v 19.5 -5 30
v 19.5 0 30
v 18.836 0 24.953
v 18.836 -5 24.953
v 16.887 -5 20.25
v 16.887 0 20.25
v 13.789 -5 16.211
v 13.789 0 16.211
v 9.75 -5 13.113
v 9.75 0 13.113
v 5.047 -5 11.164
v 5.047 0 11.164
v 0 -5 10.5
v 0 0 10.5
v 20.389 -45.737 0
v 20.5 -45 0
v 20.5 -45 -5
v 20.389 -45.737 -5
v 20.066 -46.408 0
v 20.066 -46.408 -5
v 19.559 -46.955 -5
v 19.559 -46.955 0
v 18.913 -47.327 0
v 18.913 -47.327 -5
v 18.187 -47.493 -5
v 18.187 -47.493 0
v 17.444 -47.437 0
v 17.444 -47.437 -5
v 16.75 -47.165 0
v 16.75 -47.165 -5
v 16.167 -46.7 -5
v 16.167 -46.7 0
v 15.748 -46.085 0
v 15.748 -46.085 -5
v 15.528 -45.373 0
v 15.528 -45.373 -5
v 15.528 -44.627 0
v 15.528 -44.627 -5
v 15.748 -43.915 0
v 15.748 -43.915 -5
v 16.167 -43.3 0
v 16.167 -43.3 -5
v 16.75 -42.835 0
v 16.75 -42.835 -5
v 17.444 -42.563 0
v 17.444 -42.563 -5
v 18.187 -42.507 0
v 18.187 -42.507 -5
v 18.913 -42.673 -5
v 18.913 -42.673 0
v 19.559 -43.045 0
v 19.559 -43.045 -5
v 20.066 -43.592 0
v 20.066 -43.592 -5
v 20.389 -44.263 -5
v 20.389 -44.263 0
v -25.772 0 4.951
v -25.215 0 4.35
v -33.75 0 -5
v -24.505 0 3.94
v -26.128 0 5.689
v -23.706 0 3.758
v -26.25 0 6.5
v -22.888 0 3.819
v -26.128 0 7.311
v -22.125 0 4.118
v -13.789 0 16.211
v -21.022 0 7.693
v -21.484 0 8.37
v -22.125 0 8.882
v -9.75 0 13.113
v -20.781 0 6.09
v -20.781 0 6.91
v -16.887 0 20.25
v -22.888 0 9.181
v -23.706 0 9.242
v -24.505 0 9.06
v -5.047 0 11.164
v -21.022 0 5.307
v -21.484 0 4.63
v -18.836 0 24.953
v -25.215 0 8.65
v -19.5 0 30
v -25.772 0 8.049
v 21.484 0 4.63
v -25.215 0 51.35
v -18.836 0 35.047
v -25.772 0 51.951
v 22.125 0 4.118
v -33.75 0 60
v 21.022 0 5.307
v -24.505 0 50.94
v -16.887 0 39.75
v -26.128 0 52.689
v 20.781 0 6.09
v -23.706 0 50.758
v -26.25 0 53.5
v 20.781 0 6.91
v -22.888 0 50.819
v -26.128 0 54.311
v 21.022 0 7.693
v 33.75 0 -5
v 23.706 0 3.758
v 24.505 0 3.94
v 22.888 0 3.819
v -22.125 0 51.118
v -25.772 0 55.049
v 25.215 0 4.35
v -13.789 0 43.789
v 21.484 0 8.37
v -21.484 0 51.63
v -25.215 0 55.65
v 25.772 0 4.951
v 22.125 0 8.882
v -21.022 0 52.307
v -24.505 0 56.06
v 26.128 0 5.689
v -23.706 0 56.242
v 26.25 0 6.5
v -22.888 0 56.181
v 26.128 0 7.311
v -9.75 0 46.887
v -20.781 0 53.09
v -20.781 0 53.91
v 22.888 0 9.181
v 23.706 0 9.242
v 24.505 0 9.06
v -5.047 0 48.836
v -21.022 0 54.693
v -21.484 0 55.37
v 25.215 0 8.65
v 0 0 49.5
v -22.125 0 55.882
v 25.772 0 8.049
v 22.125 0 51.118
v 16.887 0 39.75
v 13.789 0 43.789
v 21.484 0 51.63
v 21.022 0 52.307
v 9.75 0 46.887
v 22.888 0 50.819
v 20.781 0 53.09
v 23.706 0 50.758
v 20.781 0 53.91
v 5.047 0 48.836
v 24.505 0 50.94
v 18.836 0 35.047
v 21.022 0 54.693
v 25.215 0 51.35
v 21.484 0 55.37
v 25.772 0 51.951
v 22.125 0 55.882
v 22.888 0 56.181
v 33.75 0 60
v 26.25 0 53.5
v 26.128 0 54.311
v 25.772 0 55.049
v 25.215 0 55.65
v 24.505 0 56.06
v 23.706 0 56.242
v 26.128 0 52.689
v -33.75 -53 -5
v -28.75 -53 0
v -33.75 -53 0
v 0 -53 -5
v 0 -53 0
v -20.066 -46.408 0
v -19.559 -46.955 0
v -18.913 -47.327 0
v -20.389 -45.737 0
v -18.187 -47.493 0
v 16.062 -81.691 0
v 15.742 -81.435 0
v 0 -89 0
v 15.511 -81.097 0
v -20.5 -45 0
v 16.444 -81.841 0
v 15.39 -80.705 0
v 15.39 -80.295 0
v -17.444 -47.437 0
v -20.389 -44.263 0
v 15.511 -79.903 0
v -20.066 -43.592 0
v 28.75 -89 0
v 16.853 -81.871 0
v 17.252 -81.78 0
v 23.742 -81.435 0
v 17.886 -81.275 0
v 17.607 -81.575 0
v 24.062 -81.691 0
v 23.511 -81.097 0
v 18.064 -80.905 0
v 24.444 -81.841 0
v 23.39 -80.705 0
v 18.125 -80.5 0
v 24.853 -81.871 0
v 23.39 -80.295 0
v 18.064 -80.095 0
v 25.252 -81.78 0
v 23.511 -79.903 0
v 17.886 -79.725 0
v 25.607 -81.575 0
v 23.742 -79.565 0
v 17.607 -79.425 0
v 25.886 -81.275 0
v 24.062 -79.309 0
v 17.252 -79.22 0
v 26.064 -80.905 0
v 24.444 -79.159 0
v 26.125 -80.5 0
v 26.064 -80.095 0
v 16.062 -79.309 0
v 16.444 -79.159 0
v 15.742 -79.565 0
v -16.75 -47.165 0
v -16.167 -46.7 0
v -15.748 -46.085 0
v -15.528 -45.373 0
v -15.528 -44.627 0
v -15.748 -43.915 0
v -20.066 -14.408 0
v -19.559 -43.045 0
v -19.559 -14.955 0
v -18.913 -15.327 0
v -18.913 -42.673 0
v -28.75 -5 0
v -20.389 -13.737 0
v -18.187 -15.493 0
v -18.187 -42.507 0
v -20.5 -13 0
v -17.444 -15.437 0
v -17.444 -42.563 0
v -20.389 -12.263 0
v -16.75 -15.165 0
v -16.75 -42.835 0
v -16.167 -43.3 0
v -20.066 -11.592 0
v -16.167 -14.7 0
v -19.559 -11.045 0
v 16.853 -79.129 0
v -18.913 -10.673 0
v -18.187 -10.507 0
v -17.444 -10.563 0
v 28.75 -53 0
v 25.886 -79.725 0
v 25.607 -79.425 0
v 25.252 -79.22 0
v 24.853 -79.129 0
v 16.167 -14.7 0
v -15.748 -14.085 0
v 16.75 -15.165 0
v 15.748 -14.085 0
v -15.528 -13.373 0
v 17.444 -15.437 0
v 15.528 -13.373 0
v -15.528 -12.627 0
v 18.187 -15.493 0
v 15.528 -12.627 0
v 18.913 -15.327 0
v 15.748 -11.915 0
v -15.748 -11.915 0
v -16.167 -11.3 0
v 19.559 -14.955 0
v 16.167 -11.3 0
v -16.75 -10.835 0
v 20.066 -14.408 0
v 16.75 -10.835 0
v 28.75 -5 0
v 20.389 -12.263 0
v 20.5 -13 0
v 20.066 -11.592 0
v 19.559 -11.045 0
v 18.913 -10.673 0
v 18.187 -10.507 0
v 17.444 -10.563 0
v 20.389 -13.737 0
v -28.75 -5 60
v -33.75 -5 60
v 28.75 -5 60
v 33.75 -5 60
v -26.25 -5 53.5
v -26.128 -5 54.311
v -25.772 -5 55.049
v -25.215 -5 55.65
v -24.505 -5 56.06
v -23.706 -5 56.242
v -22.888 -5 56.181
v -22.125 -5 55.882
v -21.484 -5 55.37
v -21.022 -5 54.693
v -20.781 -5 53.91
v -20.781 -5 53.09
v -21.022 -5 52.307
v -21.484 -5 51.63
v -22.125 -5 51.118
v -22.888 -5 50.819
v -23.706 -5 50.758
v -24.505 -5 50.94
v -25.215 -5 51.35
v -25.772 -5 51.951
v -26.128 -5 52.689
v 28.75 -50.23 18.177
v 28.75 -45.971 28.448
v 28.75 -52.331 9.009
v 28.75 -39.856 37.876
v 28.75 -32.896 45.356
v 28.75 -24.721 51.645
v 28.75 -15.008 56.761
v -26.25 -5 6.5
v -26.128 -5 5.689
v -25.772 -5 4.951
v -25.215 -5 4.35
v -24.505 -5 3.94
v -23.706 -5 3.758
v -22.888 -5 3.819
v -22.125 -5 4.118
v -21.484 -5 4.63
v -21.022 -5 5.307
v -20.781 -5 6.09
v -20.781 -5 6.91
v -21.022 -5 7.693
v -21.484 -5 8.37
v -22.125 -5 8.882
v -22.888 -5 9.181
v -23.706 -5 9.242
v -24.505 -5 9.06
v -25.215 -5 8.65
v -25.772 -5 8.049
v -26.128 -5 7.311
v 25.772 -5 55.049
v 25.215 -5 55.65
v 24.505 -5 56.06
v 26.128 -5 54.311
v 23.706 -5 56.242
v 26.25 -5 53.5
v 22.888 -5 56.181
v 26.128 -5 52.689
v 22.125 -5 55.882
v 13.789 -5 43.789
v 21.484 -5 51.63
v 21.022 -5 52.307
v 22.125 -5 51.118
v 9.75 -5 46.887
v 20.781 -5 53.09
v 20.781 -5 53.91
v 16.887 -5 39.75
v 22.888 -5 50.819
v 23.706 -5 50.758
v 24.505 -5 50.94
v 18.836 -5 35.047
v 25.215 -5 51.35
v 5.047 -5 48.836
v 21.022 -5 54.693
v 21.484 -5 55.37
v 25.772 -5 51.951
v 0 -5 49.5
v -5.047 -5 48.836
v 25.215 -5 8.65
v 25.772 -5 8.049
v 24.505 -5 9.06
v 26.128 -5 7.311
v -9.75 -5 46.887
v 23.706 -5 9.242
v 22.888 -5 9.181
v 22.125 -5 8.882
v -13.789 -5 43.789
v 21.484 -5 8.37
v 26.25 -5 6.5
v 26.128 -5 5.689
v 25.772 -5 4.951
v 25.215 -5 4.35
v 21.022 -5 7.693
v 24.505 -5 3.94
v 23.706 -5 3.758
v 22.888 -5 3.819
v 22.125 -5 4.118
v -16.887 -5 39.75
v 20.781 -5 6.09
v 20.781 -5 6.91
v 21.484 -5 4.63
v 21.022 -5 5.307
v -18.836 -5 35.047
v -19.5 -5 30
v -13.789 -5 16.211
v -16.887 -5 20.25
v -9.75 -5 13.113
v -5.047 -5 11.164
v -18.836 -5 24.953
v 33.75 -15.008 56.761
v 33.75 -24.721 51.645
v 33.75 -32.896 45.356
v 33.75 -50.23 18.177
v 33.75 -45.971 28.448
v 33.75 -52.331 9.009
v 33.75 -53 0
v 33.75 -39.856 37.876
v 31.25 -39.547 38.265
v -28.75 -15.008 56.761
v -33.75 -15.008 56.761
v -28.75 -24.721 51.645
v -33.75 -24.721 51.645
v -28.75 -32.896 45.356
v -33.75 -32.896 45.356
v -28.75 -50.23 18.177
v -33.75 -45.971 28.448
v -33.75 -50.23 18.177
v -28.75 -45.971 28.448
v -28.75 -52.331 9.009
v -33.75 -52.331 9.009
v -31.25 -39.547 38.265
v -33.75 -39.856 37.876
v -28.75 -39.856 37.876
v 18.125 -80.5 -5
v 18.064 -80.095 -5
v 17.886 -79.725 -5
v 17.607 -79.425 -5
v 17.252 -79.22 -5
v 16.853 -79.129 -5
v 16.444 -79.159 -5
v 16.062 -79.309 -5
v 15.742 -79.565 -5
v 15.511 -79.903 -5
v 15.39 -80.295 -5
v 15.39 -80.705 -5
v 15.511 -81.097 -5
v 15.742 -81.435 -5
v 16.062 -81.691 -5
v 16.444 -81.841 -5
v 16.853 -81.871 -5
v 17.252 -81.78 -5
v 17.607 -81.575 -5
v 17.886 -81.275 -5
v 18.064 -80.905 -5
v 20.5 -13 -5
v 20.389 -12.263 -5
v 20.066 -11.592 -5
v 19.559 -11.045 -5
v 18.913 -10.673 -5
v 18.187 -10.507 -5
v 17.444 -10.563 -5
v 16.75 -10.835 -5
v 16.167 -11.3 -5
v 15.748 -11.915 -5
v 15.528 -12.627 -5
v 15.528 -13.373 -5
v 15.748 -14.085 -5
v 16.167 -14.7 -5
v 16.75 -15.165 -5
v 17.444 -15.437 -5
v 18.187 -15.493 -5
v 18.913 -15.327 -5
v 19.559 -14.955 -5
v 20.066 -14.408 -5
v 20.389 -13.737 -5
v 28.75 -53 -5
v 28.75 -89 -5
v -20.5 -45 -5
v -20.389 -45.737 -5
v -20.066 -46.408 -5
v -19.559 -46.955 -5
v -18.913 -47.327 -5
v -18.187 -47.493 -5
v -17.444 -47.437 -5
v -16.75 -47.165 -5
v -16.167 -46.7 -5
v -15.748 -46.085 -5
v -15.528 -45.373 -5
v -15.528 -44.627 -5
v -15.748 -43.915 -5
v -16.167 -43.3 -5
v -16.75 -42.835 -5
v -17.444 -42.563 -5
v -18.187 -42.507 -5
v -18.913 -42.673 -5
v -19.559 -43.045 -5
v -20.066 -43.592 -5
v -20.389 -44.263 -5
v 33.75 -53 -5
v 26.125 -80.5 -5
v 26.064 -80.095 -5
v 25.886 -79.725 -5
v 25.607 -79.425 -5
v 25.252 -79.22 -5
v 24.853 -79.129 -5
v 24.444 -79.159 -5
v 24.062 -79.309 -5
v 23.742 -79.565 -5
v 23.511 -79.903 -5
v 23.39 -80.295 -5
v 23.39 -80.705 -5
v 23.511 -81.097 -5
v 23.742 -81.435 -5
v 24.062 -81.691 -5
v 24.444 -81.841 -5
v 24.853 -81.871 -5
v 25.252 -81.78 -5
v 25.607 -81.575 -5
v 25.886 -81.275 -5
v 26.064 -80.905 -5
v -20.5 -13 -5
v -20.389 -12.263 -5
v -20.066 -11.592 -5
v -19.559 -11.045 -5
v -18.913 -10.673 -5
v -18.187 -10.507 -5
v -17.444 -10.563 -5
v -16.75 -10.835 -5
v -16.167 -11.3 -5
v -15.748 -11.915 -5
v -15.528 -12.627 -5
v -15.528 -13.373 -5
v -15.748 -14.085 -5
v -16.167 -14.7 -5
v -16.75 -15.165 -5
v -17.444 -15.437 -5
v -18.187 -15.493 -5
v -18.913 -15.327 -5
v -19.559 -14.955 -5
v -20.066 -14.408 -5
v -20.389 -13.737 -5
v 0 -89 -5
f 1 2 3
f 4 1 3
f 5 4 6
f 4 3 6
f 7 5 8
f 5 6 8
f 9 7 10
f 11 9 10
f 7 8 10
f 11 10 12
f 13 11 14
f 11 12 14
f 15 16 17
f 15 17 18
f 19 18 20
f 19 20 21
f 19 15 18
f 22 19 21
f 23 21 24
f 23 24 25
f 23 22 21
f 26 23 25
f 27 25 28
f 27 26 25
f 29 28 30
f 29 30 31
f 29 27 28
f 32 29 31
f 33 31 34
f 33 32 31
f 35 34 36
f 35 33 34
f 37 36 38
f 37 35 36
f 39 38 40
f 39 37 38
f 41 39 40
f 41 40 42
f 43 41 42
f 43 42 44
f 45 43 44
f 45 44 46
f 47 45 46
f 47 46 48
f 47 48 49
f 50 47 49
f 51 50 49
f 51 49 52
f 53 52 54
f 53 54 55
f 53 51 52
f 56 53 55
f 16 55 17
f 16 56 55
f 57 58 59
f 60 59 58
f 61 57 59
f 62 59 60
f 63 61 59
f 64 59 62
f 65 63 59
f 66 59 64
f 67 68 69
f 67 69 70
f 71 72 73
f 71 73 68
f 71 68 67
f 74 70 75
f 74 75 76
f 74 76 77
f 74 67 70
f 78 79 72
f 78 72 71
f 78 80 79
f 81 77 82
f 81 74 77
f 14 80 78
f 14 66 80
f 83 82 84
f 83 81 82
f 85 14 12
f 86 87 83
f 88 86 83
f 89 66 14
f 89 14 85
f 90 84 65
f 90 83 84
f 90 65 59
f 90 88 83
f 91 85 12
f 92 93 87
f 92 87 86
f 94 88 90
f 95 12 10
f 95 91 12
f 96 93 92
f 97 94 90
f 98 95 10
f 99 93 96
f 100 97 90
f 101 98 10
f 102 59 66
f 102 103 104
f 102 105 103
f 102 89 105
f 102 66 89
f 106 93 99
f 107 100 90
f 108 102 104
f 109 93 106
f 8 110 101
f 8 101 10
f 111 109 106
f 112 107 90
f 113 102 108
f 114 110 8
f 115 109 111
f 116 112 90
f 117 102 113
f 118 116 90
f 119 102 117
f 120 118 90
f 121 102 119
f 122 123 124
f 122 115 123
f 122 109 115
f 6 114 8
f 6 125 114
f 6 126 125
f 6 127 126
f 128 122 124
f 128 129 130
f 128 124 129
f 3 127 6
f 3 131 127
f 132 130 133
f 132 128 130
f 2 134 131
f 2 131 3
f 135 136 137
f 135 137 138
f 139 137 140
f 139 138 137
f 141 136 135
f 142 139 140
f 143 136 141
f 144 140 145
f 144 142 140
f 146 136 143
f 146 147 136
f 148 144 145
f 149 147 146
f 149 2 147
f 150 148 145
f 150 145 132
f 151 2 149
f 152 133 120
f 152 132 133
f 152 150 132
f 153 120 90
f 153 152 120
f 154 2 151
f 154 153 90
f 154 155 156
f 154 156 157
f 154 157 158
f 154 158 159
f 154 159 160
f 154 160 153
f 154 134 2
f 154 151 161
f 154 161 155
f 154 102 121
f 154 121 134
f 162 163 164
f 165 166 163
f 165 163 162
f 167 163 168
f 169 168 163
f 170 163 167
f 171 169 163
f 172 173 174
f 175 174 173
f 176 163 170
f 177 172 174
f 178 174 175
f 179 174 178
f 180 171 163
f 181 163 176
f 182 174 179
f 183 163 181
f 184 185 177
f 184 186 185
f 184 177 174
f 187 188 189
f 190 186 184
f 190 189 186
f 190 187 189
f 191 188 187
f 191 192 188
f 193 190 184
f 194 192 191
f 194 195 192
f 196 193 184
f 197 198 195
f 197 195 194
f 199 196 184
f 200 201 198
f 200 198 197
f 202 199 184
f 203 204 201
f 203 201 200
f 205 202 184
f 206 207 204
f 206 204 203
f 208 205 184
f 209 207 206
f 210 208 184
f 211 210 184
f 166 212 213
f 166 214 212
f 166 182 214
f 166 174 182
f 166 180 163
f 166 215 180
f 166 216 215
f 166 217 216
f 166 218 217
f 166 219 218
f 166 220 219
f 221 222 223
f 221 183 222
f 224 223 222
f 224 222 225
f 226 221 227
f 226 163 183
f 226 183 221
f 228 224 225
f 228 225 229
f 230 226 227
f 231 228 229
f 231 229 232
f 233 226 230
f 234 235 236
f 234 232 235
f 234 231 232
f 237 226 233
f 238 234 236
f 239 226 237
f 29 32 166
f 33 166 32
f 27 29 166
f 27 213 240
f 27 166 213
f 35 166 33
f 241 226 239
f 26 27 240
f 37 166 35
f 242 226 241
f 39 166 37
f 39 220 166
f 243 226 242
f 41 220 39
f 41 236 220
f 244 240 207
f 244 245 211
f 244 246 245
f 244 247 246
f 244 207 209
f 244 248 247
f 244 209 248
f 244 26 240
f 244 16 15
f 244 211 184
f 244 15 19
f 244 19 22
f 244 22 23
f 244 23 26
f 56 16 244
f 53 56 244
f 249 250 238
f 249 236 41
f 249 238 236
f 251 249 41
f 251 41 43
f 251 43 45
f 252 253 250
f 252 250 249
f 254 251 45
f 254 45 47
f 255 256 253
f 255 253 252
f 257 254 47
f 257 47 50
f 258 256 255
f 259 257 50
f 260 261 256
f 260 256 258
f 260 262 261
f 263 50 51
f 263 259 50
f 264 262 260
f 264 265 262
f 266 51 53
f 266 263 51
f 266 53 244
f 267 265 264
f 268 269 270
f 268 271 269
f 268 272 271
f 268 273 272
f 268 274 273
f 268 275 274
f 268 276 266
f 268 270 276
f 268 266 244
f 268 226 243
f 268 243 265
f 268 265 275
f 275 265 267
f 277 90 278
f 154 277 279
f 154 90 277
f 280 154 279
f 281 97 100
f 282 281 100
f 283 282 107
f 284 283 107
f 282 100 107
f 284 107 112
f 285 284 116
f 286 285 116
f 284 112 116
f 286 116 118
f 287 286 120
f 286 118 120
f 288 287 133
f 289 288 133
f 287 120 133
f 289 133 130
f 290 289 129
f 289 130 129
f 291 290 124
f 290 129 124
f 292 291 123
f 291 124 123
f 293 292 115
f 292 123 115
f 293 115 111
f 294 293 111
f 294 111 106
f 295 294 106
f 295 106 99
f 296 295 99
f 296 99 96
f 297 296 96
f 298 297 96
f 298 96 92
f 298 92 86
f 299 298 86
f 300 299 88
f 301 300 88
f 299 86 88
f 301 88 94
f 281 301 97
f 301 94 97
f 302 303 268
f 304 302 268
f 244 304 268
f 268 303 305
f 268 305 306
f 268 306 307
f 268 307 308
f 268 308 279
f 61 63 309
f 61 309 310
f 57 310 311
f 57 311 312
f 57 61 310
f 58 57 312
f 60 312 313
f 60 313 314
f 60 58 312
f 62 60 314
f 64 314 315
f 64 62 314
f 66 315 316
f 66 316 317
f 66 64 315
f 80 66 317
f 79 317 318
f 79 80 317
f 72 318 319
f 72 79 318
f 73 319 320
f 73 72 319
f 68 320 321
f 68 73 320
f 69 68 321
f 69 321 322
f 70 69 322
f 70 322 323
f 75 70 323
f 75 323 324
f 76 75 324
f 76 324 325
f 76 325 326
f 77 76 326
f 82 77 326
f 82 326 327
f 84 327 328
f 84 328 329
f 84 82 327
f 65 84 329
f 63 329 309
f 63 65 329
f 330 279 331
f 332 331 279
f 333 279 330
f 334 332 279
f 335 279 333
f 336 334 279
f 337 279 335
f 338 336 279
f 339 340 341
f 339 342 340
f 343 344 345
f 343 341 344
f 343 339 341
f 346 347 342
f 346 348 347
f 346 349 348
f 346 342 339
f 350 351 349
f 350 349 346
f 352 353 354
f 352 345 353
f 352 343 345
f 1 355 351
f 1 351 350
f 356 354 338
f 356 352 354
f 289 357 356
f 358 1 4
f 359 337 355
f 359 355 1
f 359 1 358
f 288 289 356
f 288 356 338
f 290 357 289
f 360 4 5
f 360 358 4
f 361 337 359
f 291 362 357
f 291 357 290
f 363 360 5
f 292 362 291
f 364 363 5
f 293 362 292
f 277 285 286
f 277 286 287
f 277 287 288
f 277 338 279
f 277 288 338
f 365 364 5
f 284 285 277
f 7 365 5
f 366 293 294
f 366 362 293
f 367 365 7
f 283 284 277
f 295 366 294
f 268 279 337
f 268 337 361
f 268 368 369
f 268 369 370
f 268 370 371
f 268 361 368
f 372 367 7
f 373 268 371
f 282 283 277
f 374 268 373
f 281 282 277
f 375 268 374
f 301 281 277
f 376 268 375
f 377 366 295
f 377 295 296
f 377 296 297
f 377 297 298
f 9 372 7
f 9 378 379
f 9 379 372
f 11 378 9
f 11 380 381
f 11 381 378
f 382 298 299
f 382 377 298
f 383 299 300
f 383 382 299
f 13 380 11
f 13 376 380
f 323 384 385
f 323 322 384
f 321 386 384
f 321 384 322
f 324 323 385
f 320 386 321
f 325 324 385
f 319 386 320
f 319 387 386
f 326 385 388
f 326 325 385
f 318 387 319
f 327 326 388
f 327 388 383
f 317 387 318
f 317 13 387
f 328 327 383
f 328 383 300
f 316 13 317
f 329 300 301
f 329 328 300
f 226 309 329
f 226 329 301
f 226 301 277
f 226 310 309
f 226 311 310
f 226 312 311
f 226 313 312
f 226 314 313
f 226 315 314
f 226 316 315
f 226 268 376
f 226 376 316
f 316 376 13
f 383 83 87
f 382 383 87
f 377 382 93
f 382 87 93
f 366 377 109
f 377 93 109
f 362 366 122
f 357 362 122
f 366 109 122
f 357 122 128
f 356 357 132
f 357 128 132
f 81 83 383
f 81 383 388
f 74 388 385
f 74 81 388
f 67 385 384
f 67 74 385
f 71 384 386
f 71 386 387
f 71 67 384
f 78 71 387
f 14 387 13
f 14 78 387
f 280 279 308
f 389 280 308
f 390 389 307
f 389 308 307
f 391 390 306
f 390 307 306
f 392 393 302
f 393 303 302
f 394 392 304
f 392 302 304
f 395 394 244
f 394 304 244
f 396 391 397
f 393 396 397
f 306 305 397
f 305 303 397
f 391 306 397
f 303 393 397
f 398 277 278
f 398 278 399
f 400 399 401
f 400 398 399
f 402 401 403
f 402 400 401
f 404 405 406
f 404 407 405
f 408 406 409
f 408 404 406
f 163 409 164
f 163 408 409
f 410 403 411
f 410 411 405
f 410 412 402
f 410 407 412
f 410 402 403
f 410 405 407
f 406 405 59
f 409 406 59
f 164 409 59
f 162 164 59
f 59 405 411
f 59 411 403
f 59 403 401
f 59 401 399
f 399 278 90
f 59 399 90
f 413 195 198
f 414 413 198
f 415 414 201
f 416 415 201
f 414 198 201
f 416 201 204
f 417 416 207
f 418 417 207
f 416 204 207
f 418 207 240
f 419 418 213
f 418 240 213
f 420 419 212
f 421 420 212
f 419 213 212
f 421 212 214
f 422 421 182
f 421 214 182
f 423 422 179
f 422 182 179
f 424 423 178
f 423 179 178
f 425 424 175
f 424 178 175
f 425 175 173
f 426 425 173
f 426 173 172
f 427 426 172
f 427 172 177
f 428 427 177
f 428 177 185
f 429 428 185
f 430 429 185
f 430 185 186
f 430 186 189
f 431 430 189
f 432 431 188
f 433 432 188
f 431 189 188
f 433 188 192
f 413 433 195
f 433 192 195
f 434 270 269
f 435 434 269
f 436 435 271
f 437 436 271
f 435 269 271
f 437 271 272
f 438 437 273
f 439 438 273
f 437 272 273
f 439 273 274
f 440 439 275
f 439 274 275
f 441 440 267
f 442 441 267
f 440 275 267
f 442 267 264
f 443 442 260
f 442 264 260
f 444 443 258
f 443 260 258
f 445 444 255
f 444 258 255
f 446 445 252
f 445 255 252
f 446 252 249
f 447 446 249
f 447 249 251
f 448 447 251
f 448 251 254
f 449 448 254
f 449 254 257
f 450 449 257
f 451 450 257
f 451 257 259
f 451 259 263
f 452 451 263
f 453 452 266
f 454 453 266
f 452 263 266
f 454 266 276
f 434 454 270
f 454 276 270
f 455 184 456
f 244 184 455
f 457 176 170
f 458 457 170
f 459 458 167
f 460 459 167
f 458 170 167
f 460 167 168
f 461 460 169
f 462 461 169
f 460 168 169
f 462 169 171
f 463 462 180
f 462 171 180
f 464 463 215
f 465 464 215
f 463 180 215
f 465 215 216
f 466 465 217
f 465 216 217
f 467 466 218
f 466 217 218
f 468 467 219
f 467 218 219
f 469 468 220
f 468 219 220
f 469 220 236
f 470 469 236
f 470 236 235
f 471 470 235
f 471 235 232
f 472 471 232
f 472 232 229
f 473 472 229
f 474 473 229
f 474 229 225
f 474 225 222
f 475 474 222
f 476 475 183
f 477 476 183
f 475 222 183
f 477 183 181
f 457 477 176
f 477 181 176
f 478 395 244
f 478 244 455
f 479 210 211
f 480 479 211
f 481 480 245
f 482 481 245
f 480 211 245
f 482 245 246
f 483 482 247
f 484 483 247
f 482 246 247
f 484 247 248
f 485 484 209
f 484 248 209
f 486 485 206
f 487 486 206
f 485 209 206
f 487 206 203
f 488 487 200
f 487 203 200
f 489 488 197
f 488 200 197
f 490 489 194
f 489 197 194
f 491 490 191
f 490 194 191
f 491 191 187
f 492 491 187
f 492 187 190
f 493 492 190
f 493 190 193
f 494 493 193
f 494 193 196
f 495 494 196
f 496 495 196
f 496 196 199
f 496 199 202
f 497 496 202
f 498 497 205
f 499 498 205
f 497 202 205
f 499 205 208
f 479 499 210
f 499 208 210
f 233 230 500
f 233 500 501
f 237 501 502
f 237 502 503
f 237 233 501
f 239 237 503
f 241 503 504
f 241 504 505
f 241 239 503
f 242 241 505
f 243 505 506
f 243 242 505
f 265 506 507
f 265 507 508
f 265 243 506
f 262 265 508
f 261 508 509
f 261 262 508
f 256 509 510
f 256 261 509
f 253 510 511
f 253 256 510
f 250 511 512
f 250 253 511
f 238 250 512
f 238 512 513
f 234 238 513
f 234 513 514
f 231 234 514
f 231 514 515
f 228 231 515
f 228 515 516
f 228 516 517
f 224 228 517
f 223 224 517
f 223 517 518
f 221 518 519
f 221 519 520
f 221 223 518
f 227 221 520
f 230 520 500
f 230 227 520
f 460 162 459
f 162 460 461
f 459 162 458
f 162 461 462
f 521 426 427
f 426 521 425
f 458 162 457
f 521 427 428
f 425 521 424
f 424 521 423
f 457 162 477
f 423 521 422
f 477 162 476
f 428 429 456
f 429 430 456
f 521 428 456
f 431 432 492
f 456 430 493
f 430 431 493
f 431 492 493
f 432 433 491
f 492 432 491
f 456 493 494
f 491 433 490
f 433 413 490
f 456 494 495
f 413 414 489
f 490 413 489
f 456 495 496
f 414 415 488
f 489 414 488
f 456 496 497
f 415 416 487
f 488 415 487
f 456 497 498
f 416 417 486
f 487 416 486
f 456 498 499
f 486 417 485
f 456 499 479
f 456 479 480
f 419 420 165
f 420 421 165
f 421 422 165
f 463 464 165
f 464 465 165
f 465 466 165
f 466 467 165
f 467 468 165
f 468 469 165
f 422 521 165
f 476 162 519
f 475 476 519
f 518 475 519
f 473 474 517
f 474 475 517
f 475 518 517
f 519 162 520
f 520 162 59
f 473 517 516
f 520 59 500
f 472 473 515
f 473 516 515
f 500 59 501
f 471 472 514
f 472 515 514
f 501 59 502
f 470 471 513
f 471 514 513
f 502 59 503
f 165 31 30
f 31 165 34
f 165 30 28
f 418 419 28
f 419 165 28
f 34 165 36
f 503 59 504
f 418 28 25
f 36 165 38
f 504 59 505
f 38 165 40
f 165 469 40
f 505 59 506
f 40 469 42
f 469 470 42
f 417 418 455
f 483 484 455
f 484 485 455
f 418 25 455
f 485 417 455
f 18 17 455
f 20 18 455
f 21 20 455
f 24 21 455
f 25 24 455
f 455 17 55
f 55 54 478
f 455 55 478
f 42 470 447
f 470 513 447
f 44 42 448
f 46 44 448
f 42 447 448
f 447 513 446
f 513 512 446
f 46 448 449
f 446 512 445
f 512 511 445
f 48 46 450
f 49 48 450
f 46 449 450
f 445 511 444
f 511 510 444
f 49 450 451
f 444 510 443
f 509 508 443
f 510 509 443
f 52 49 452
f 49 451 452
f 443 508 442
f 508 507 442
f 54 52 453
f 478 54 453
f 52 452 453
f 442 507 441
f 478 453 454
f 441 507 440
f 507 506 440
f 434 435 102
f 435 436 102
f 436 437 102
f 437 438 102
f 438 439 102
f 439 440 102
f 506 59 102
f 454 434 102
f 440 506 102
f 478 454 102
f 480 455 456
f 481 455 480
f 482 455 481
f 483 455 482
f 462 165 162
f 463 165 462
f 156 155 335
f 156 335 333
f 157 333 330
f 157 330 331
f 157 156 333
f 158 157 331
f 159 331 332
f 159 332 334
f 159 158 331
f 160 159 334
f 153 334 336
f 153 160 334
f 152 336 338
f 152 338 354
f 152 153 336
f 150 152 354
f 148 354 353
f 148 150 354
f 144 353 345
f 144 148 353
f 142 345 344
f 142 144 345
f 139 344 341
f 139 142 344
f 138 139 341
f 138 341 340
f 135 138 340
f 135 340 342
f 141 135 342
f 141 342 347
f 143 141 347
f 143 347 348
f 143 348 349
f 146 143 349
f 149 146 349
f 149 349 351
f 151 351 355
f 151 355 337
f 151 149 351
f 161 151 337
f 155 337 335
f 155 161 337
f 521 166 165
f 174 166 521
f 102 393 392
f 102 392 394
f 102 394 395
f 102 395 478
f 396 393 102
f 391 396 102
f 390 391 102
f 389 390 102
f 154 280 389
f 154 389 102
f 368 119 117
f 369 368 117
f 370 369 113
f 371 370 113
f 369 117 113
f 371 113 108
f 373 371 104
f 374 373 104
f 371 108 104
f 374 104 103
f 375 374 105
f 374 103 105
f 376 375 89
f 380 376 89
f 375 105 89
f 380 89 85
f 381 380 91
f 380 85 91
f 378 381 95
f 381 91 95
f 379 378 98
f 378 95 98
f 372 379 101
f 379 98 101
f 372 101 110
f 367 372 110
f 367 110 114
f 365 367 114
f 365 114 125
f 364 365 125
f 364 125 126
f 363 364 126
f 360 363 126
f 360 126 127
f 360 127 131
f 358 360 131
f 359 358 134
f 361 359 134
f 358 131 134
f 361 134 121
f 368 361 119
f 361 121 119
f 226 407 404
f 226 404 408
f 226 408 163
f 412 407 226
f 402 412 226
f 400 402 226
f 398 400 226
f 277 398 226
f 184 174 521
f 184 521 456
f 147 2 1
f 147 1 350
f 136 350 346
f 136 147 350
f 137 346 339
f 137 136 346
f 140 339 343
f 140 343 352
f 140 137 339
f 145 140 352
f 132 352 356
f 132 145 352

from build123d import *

# Parameters (mm, degrees)
SKETCH006_R                = 2.75
PAD003_DEPTH               = 5
SKETCH006_MIRRORED003_2_R  = 2.75
PAD003_MIRRORED003_2_DEPTH = 5
BOX_W                      = 32.75
BOX_H                      = 5
BOX_DEPTH                  = 5
SKETCH007_W                = 28.75
SKETCH007_H                = 24
SKETCH007_R                = 2.5
PAD004_DEPTH               = 5
SKETCH007_MIRRORED006_2_W  = 28.75
SKETCH007_MIRRORED006_2_H  = 24
SKETCH007_MIRRORED006_2_R  = 2.5
PAD004_MIRRORED006_2_DEPTH = 5
PAD005_DEPTH               = 5
SKETCH009_R                = 1.375
PAD006_DEPTH               = 5


with BuildPart() as part:
    # Sketch006 → Pad003 (new body)
    with BuildSketch(Plane(origin=(0, 0, 30), x_dir=(1, 0, 0), z_dir=(0, -1, 0))):
        with BuildLine():
            ThreePointArc((19.5, 0), (13.788582, 13.788582), (0, 19.5))
            Line((0, 19.5), (0, 30))
            Line((28.75, 30), (0, 30))
            Line((28.75, 30), (28.75, 0))
            Line((19.5, 0), (28.75, 0))
        make_face()
        with Locations((23.5, 23.5)):
            Circle(SKETCH006_R, mode=Mode.SUBTRACT)
    pad003 = extrude(amount=PAD003_DEPTH)

    # Sketch006 Mirrored003 2 → Pad003 Mirrored003 2 (add)
    with BuildSketch(Plane(origin=(0, 0, 30), x_dir=(-1, 0, 0), z_dir=(0, 1, 0))):
        with BuildLine():
            ThreePointArc((19.5, 0), (13.788582, 13.788582), (0, 19.5))
            Line((0, 19.5), (0, 30))
            Line((28.75, 30), (0, 30))
            Line((28.75, 30), (28.75, 0))
            Line((19.5, 0), (28.75, 0))
        make_face()
        with Locations((23.5, 23.5)):
            Circle(SKETCH006_MIRRORED003_2_R, mode=Mode.SUBTRACT)
    pad003_mirrored003_2 = extrude(amount=-PAD003_MIRRORED003_2_DEPTH)

    # Mirrored004: Pad003, Pad003 Mirrored003 2 across Sketch006 H_Axis
    add(pad003.mirror(Plane(origin=(0, 0, 30), x_dir=(0, -1, 0), z_dir=(0, 0, 1))))
    add(pad003_mirrored003_2.mirror(Plane(origin=(0, 0, 30), x_dir=(0, -1, 0), z_dir=(0, 0, 1))))

    # Box → Box (join)
    with BuildSketch(Plane(origin=(0, -5, -5), x_dir=(1, 0, 0), z_dir=(0, 0, 1))):
        with Locations((16.375, 2.5)):
            Rectangle(BOX_W, BOX_H)
    box = extrude(amount=BOX_DEPTH)

    # Mirrored005: Box across YZ
    add(box.mirror(Plane.YZ))

    # Sketch007 → Pad004 (join)
    with BuildSketch(Plane(origin=(0, -29, 0), x_dir=(1, 0, 0), z_dir=(0, 0, 1))):
        with Locations((14.375, 12)):
            Rectangle(SKETCH007_W, SKETCH007_H)
        with Locations((18, 16)):
            Circle(SKETCH007_R, mode=Mode.SUBTRACT)
    pad004 = extrude(amount=-PAD004_DEPTH)

    # Sketch007 Mirrored006 2 → Pad004 Mirrored006 2 (add)
    with BuildSketch(Plane(origin=(0, -29, 0), x_dir=(-1, 0, 0), z_dir=(0, 0, -1))):
        with Locations((14.375, 12)):
            Rectangle(SKETCH007_MIRRORED006_2_W, SKETCH007_MIRRORED006_2_H)
        with Locations((18, 16)):
            Circle(SKETCH007_MIRRORED006_2_R, mode=Mode.SUBTRACT)
    pad004_mirrored006_2 = extrude(amount=PAD004_MIRRORED006_2_DEPTH)

    # Mirrored007: Pad004, Pad004 Mirrored006 2 across Sketch007 H_Axis
    add(pad004.mirror(Plane.ZX.offset(-29)))
    add(pad004_mirrored006_2.mirror(Plane.ZX.offset(-29)))

    # Sketch008 → Pad005 (join)
    with BuildSketch(Plane.YZ.offset(28.75)):
        with BuildLine():
            Line((0, 60), (-5, 60))
            add(Edge.make_bspline(
                [(-5, 60), (-53, 48.806333), (-53, 0)],
                knots=[1.802205, 1.802205, 1.802205, 3.141593, 3.141593, 3.141593], degree=2, weights=[1, 0.784012, 1]))
            Line((-53, 0), (-53, -5))
            Line((-53, -5), (0, -5))
            Line((0, -5), (0, 60))
        make_face()
    pad005 = extrude(amount=PAD005_DEPTH)

    # Mirrored008: Pad005 across YZ
    add(pad005.mirror(Plane.YZ))

    # Sketch009 → Pad006 (join)
    with BuildSketch(Plane.XY):
        Polygon((28.75, -72), (28.75, -53), (0, -53), (0, -72), (0, -89), (28.75, -89), (28.75, -80.5), align=None)
        with Locations((24.75, -80.5)):
            Circle(SKETCH009_R, mode=Mode.SUBTRACT)
        with Locations((16.75, -80.5)):
            Circle(SKETCH009_R, mode=Mode.SUBTRACT)
    extrude(amount=-PAD006_DEPTH)


solid = part.part
